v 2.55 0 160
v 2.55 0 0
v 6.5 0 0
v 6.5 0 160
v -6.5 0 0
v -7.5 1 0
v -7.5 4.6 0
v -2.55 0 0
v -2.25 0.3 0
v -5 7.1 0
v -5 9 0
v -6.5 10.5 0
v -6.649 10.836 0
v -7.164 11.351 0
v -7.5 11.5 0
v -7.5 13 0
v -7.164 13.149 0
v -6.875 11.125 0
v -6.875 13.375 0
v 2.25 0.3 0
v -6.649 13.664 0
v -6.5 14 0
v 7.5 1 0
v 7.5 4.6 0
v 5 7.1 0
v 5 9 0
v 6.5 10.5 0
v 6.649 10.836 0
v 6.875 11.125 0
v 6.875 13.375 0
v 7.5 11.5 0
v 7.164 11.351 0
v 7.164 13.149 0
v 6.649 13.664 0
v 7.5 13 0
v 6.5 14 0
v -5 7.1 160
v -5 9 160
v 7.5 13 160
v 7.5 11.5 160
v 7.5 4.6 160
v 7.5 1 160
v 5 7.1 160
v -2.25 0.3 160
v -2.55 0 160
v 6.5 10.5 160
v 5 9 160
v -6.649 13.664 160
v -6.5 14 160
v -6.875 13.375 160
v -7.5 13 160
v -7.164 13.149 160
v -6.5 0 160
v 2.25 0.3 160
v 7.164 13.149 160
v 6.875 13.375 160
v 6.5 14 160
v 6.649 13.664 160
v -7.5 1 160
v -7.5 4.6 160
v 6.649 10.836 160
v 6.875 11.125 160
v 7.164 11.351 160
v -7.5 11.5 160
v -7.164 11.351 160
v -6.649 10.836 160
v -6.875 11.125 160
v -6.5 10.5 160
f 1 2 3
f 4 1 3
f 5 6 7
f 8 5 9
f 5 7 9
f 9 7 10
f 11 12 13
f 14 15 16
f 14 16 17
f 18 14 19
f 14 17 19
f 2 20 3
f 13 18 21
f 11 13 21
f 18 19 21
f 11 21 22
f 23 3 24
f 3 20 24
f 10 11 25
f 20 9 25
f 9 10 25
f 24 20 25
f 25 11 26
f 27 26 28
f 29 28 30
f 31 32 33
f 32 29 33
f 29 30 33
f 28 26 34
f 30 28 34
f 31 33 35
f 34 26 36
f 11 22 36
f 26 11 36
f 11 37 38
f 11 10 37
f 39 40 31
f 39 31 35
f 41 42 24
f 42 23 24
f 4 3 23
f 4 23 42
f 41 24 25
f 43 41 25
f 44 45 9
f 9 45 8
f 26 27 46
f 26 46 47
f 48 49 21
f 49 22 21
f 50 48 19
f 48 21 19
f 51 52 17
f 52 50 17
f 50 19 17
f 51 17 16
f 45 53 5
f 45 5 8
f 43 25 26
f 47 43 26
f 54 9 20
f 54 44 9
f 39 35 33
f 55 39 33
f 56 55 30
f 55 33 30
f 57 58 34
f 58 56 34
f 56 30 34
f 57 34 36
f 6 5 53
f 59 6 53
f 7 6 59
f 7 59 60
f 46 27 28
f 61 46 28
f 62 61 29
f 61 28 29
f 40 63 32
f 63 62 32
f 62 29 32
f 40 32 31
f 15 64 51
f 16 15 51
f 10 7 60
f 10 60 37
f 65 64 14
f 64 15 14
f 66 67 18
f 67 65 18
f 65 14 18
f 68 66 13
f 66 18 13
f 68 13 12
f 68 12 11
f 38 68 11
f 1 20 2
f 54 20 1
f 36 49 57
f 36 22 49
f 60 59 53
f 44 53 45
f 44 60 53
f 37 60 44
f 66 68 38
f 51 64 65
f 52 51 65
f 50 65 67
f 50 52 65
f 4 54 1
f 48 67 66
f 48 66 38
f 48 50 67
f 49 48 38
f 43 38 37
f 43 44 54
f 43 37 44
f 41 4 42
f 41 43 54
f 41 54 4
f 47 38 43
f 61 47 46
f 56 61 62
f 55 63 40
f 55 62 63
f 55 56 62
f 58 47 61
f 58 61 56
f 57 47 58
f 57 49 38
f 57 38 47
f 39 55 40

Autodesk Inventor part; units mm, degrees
ref_plane "YZ Plane" through (0, 0, 0) normal (1, 0, 0) x (0, 1, 0)
ref_plane "XZ Plane" through (0, 0, 0) normal (0, 1, 0) x (-1, 0, 0)
ref_plane "XY Plane" through (0, 0, 0) normal (0, 0, 1) x (1, 0, 0)
sketch "Sketch1" plane through (0, 0, 0) normal (0, 0, 1) x (1, 0, 0)
  line L0 (-7.5, 0) -> (7.5, 0)
  line L1 (0, 0) -> (0, 20) construction
  line L2 (-6.5, 14) -> (6.5, 14)
  line L3 (-7.5, 0) -> (-7.5, 4.6)
  line L4 (7.5, 0) -> (7.5, 4.6)
  line L5 (-5, 7.1) -> (-5, 9)
  line L6 (5, 7.1) -> (5, 9)
  line L7 (-7.5, 11.5) -> (-7.5, 13)
  line L8 (7.5, 11.5) -> (7.5, 13)
  arc A0 (-6.5, 10.5) -> (-7.5, 11.5) centre (-7.9354, 10.0646) ccw
  arc A1 (-7.5, 13) -> (-6.5, 14) centre (-7.9354, 14.4354) ccw
  arc A2 (6.5, 14) -> (7.5, 13) centre (7.9354, 14.4354) ccw
  arc A3 (7.5, 11.5) -> (6.5, 10.5) centre (7.9354, 10.0646) ccw
  line L9 (-7.5, 4.6) -> (-5, 7.1)
  line L10 (7.5, 4.6) -> (5, 7.1)
  line L11 (-6.5, 10.5) -> (-5, 9)
  line L12 (6.5, 10.5) -> (5, 9)
  point P0 (-5, 0)
  point P1 (-5, 8.6667)
  point P2 (5, 0)
  point P3 (5, 8.6667)
  point P4 (7.5, 12.25)
  point P5 (-7.5, 12.25)
  point P6 (0, 14)
  point P7 (-5.75, 6.35)
  point P8 (5.75, 6.35)
  point P9 (0, 10)
  point P10 (0, 10.5)
  dimension "d0" = 15
  dimension "d3" = 14
  dimension "d4" = 4.6
  dimension "d5" = 5
  dimension "d20" = 7.5
  dimension "d21" = 7.5
  dimension "d22" = 1.5
  dimension "d23" = 1.5
  dimension "d25" = 1.5
  dimension "d40" = 15
  dimension "d52" = 45
  dimension "d54" = 1.5
  dimension "d55" = 1
  dimension "d56" = 1
  dimension "d57" = 1
  dimension "d58" = 1
  dimension "d59" = 1
  dimension "d60" = 1
  dimension "d61" = 45
  dimension "d62" = 45
  dimension "d63" = 13
  dimension "d64" = 10
  dimension "d65" = 3.5
extrude "Extrusion1" add sketch "Sketch1" along normal blind 160
chamfer "Chamfer1" distance 1 angle 45 2 edges at (-7.5, 0, 80) (7.5, 0, 80)
sketch "Sketch3" plane through (0, 0, 160) normal (0, 0, 1) x (1, 0, 0)
  line L0 (-6.5, 0) -> (6.5, 0) construction
  line L1 (0, 0) -> (0, 0.3) construction
  line L2 (-2.25, 0) -> (-2.25, 0.3)
  line L3 (2.25, 0) -> (2.25, 0.3)
  line L4 (-2.25, 0.3) -> (2.25, 0.3)
  line L5 (-2.25, 0) -> (2.25, 0)
  line L6 (-6.5, 0) -> (6.5, 0) construction
  dimension "d71" = 0.3
  dimension "d72" = 2.25
  dimension "d73" = 0.3
  dimension "d74" = 0
extrude "Extrusion2" cut sketch "Sketch3" against normal through all
chamfer "Chamfer2" distance 0.3 angle 45 2 edges at (-2.25, 0, 80) (2.25, 0, 80)
properties part number "LinearRail" material "Stainless Steel"
